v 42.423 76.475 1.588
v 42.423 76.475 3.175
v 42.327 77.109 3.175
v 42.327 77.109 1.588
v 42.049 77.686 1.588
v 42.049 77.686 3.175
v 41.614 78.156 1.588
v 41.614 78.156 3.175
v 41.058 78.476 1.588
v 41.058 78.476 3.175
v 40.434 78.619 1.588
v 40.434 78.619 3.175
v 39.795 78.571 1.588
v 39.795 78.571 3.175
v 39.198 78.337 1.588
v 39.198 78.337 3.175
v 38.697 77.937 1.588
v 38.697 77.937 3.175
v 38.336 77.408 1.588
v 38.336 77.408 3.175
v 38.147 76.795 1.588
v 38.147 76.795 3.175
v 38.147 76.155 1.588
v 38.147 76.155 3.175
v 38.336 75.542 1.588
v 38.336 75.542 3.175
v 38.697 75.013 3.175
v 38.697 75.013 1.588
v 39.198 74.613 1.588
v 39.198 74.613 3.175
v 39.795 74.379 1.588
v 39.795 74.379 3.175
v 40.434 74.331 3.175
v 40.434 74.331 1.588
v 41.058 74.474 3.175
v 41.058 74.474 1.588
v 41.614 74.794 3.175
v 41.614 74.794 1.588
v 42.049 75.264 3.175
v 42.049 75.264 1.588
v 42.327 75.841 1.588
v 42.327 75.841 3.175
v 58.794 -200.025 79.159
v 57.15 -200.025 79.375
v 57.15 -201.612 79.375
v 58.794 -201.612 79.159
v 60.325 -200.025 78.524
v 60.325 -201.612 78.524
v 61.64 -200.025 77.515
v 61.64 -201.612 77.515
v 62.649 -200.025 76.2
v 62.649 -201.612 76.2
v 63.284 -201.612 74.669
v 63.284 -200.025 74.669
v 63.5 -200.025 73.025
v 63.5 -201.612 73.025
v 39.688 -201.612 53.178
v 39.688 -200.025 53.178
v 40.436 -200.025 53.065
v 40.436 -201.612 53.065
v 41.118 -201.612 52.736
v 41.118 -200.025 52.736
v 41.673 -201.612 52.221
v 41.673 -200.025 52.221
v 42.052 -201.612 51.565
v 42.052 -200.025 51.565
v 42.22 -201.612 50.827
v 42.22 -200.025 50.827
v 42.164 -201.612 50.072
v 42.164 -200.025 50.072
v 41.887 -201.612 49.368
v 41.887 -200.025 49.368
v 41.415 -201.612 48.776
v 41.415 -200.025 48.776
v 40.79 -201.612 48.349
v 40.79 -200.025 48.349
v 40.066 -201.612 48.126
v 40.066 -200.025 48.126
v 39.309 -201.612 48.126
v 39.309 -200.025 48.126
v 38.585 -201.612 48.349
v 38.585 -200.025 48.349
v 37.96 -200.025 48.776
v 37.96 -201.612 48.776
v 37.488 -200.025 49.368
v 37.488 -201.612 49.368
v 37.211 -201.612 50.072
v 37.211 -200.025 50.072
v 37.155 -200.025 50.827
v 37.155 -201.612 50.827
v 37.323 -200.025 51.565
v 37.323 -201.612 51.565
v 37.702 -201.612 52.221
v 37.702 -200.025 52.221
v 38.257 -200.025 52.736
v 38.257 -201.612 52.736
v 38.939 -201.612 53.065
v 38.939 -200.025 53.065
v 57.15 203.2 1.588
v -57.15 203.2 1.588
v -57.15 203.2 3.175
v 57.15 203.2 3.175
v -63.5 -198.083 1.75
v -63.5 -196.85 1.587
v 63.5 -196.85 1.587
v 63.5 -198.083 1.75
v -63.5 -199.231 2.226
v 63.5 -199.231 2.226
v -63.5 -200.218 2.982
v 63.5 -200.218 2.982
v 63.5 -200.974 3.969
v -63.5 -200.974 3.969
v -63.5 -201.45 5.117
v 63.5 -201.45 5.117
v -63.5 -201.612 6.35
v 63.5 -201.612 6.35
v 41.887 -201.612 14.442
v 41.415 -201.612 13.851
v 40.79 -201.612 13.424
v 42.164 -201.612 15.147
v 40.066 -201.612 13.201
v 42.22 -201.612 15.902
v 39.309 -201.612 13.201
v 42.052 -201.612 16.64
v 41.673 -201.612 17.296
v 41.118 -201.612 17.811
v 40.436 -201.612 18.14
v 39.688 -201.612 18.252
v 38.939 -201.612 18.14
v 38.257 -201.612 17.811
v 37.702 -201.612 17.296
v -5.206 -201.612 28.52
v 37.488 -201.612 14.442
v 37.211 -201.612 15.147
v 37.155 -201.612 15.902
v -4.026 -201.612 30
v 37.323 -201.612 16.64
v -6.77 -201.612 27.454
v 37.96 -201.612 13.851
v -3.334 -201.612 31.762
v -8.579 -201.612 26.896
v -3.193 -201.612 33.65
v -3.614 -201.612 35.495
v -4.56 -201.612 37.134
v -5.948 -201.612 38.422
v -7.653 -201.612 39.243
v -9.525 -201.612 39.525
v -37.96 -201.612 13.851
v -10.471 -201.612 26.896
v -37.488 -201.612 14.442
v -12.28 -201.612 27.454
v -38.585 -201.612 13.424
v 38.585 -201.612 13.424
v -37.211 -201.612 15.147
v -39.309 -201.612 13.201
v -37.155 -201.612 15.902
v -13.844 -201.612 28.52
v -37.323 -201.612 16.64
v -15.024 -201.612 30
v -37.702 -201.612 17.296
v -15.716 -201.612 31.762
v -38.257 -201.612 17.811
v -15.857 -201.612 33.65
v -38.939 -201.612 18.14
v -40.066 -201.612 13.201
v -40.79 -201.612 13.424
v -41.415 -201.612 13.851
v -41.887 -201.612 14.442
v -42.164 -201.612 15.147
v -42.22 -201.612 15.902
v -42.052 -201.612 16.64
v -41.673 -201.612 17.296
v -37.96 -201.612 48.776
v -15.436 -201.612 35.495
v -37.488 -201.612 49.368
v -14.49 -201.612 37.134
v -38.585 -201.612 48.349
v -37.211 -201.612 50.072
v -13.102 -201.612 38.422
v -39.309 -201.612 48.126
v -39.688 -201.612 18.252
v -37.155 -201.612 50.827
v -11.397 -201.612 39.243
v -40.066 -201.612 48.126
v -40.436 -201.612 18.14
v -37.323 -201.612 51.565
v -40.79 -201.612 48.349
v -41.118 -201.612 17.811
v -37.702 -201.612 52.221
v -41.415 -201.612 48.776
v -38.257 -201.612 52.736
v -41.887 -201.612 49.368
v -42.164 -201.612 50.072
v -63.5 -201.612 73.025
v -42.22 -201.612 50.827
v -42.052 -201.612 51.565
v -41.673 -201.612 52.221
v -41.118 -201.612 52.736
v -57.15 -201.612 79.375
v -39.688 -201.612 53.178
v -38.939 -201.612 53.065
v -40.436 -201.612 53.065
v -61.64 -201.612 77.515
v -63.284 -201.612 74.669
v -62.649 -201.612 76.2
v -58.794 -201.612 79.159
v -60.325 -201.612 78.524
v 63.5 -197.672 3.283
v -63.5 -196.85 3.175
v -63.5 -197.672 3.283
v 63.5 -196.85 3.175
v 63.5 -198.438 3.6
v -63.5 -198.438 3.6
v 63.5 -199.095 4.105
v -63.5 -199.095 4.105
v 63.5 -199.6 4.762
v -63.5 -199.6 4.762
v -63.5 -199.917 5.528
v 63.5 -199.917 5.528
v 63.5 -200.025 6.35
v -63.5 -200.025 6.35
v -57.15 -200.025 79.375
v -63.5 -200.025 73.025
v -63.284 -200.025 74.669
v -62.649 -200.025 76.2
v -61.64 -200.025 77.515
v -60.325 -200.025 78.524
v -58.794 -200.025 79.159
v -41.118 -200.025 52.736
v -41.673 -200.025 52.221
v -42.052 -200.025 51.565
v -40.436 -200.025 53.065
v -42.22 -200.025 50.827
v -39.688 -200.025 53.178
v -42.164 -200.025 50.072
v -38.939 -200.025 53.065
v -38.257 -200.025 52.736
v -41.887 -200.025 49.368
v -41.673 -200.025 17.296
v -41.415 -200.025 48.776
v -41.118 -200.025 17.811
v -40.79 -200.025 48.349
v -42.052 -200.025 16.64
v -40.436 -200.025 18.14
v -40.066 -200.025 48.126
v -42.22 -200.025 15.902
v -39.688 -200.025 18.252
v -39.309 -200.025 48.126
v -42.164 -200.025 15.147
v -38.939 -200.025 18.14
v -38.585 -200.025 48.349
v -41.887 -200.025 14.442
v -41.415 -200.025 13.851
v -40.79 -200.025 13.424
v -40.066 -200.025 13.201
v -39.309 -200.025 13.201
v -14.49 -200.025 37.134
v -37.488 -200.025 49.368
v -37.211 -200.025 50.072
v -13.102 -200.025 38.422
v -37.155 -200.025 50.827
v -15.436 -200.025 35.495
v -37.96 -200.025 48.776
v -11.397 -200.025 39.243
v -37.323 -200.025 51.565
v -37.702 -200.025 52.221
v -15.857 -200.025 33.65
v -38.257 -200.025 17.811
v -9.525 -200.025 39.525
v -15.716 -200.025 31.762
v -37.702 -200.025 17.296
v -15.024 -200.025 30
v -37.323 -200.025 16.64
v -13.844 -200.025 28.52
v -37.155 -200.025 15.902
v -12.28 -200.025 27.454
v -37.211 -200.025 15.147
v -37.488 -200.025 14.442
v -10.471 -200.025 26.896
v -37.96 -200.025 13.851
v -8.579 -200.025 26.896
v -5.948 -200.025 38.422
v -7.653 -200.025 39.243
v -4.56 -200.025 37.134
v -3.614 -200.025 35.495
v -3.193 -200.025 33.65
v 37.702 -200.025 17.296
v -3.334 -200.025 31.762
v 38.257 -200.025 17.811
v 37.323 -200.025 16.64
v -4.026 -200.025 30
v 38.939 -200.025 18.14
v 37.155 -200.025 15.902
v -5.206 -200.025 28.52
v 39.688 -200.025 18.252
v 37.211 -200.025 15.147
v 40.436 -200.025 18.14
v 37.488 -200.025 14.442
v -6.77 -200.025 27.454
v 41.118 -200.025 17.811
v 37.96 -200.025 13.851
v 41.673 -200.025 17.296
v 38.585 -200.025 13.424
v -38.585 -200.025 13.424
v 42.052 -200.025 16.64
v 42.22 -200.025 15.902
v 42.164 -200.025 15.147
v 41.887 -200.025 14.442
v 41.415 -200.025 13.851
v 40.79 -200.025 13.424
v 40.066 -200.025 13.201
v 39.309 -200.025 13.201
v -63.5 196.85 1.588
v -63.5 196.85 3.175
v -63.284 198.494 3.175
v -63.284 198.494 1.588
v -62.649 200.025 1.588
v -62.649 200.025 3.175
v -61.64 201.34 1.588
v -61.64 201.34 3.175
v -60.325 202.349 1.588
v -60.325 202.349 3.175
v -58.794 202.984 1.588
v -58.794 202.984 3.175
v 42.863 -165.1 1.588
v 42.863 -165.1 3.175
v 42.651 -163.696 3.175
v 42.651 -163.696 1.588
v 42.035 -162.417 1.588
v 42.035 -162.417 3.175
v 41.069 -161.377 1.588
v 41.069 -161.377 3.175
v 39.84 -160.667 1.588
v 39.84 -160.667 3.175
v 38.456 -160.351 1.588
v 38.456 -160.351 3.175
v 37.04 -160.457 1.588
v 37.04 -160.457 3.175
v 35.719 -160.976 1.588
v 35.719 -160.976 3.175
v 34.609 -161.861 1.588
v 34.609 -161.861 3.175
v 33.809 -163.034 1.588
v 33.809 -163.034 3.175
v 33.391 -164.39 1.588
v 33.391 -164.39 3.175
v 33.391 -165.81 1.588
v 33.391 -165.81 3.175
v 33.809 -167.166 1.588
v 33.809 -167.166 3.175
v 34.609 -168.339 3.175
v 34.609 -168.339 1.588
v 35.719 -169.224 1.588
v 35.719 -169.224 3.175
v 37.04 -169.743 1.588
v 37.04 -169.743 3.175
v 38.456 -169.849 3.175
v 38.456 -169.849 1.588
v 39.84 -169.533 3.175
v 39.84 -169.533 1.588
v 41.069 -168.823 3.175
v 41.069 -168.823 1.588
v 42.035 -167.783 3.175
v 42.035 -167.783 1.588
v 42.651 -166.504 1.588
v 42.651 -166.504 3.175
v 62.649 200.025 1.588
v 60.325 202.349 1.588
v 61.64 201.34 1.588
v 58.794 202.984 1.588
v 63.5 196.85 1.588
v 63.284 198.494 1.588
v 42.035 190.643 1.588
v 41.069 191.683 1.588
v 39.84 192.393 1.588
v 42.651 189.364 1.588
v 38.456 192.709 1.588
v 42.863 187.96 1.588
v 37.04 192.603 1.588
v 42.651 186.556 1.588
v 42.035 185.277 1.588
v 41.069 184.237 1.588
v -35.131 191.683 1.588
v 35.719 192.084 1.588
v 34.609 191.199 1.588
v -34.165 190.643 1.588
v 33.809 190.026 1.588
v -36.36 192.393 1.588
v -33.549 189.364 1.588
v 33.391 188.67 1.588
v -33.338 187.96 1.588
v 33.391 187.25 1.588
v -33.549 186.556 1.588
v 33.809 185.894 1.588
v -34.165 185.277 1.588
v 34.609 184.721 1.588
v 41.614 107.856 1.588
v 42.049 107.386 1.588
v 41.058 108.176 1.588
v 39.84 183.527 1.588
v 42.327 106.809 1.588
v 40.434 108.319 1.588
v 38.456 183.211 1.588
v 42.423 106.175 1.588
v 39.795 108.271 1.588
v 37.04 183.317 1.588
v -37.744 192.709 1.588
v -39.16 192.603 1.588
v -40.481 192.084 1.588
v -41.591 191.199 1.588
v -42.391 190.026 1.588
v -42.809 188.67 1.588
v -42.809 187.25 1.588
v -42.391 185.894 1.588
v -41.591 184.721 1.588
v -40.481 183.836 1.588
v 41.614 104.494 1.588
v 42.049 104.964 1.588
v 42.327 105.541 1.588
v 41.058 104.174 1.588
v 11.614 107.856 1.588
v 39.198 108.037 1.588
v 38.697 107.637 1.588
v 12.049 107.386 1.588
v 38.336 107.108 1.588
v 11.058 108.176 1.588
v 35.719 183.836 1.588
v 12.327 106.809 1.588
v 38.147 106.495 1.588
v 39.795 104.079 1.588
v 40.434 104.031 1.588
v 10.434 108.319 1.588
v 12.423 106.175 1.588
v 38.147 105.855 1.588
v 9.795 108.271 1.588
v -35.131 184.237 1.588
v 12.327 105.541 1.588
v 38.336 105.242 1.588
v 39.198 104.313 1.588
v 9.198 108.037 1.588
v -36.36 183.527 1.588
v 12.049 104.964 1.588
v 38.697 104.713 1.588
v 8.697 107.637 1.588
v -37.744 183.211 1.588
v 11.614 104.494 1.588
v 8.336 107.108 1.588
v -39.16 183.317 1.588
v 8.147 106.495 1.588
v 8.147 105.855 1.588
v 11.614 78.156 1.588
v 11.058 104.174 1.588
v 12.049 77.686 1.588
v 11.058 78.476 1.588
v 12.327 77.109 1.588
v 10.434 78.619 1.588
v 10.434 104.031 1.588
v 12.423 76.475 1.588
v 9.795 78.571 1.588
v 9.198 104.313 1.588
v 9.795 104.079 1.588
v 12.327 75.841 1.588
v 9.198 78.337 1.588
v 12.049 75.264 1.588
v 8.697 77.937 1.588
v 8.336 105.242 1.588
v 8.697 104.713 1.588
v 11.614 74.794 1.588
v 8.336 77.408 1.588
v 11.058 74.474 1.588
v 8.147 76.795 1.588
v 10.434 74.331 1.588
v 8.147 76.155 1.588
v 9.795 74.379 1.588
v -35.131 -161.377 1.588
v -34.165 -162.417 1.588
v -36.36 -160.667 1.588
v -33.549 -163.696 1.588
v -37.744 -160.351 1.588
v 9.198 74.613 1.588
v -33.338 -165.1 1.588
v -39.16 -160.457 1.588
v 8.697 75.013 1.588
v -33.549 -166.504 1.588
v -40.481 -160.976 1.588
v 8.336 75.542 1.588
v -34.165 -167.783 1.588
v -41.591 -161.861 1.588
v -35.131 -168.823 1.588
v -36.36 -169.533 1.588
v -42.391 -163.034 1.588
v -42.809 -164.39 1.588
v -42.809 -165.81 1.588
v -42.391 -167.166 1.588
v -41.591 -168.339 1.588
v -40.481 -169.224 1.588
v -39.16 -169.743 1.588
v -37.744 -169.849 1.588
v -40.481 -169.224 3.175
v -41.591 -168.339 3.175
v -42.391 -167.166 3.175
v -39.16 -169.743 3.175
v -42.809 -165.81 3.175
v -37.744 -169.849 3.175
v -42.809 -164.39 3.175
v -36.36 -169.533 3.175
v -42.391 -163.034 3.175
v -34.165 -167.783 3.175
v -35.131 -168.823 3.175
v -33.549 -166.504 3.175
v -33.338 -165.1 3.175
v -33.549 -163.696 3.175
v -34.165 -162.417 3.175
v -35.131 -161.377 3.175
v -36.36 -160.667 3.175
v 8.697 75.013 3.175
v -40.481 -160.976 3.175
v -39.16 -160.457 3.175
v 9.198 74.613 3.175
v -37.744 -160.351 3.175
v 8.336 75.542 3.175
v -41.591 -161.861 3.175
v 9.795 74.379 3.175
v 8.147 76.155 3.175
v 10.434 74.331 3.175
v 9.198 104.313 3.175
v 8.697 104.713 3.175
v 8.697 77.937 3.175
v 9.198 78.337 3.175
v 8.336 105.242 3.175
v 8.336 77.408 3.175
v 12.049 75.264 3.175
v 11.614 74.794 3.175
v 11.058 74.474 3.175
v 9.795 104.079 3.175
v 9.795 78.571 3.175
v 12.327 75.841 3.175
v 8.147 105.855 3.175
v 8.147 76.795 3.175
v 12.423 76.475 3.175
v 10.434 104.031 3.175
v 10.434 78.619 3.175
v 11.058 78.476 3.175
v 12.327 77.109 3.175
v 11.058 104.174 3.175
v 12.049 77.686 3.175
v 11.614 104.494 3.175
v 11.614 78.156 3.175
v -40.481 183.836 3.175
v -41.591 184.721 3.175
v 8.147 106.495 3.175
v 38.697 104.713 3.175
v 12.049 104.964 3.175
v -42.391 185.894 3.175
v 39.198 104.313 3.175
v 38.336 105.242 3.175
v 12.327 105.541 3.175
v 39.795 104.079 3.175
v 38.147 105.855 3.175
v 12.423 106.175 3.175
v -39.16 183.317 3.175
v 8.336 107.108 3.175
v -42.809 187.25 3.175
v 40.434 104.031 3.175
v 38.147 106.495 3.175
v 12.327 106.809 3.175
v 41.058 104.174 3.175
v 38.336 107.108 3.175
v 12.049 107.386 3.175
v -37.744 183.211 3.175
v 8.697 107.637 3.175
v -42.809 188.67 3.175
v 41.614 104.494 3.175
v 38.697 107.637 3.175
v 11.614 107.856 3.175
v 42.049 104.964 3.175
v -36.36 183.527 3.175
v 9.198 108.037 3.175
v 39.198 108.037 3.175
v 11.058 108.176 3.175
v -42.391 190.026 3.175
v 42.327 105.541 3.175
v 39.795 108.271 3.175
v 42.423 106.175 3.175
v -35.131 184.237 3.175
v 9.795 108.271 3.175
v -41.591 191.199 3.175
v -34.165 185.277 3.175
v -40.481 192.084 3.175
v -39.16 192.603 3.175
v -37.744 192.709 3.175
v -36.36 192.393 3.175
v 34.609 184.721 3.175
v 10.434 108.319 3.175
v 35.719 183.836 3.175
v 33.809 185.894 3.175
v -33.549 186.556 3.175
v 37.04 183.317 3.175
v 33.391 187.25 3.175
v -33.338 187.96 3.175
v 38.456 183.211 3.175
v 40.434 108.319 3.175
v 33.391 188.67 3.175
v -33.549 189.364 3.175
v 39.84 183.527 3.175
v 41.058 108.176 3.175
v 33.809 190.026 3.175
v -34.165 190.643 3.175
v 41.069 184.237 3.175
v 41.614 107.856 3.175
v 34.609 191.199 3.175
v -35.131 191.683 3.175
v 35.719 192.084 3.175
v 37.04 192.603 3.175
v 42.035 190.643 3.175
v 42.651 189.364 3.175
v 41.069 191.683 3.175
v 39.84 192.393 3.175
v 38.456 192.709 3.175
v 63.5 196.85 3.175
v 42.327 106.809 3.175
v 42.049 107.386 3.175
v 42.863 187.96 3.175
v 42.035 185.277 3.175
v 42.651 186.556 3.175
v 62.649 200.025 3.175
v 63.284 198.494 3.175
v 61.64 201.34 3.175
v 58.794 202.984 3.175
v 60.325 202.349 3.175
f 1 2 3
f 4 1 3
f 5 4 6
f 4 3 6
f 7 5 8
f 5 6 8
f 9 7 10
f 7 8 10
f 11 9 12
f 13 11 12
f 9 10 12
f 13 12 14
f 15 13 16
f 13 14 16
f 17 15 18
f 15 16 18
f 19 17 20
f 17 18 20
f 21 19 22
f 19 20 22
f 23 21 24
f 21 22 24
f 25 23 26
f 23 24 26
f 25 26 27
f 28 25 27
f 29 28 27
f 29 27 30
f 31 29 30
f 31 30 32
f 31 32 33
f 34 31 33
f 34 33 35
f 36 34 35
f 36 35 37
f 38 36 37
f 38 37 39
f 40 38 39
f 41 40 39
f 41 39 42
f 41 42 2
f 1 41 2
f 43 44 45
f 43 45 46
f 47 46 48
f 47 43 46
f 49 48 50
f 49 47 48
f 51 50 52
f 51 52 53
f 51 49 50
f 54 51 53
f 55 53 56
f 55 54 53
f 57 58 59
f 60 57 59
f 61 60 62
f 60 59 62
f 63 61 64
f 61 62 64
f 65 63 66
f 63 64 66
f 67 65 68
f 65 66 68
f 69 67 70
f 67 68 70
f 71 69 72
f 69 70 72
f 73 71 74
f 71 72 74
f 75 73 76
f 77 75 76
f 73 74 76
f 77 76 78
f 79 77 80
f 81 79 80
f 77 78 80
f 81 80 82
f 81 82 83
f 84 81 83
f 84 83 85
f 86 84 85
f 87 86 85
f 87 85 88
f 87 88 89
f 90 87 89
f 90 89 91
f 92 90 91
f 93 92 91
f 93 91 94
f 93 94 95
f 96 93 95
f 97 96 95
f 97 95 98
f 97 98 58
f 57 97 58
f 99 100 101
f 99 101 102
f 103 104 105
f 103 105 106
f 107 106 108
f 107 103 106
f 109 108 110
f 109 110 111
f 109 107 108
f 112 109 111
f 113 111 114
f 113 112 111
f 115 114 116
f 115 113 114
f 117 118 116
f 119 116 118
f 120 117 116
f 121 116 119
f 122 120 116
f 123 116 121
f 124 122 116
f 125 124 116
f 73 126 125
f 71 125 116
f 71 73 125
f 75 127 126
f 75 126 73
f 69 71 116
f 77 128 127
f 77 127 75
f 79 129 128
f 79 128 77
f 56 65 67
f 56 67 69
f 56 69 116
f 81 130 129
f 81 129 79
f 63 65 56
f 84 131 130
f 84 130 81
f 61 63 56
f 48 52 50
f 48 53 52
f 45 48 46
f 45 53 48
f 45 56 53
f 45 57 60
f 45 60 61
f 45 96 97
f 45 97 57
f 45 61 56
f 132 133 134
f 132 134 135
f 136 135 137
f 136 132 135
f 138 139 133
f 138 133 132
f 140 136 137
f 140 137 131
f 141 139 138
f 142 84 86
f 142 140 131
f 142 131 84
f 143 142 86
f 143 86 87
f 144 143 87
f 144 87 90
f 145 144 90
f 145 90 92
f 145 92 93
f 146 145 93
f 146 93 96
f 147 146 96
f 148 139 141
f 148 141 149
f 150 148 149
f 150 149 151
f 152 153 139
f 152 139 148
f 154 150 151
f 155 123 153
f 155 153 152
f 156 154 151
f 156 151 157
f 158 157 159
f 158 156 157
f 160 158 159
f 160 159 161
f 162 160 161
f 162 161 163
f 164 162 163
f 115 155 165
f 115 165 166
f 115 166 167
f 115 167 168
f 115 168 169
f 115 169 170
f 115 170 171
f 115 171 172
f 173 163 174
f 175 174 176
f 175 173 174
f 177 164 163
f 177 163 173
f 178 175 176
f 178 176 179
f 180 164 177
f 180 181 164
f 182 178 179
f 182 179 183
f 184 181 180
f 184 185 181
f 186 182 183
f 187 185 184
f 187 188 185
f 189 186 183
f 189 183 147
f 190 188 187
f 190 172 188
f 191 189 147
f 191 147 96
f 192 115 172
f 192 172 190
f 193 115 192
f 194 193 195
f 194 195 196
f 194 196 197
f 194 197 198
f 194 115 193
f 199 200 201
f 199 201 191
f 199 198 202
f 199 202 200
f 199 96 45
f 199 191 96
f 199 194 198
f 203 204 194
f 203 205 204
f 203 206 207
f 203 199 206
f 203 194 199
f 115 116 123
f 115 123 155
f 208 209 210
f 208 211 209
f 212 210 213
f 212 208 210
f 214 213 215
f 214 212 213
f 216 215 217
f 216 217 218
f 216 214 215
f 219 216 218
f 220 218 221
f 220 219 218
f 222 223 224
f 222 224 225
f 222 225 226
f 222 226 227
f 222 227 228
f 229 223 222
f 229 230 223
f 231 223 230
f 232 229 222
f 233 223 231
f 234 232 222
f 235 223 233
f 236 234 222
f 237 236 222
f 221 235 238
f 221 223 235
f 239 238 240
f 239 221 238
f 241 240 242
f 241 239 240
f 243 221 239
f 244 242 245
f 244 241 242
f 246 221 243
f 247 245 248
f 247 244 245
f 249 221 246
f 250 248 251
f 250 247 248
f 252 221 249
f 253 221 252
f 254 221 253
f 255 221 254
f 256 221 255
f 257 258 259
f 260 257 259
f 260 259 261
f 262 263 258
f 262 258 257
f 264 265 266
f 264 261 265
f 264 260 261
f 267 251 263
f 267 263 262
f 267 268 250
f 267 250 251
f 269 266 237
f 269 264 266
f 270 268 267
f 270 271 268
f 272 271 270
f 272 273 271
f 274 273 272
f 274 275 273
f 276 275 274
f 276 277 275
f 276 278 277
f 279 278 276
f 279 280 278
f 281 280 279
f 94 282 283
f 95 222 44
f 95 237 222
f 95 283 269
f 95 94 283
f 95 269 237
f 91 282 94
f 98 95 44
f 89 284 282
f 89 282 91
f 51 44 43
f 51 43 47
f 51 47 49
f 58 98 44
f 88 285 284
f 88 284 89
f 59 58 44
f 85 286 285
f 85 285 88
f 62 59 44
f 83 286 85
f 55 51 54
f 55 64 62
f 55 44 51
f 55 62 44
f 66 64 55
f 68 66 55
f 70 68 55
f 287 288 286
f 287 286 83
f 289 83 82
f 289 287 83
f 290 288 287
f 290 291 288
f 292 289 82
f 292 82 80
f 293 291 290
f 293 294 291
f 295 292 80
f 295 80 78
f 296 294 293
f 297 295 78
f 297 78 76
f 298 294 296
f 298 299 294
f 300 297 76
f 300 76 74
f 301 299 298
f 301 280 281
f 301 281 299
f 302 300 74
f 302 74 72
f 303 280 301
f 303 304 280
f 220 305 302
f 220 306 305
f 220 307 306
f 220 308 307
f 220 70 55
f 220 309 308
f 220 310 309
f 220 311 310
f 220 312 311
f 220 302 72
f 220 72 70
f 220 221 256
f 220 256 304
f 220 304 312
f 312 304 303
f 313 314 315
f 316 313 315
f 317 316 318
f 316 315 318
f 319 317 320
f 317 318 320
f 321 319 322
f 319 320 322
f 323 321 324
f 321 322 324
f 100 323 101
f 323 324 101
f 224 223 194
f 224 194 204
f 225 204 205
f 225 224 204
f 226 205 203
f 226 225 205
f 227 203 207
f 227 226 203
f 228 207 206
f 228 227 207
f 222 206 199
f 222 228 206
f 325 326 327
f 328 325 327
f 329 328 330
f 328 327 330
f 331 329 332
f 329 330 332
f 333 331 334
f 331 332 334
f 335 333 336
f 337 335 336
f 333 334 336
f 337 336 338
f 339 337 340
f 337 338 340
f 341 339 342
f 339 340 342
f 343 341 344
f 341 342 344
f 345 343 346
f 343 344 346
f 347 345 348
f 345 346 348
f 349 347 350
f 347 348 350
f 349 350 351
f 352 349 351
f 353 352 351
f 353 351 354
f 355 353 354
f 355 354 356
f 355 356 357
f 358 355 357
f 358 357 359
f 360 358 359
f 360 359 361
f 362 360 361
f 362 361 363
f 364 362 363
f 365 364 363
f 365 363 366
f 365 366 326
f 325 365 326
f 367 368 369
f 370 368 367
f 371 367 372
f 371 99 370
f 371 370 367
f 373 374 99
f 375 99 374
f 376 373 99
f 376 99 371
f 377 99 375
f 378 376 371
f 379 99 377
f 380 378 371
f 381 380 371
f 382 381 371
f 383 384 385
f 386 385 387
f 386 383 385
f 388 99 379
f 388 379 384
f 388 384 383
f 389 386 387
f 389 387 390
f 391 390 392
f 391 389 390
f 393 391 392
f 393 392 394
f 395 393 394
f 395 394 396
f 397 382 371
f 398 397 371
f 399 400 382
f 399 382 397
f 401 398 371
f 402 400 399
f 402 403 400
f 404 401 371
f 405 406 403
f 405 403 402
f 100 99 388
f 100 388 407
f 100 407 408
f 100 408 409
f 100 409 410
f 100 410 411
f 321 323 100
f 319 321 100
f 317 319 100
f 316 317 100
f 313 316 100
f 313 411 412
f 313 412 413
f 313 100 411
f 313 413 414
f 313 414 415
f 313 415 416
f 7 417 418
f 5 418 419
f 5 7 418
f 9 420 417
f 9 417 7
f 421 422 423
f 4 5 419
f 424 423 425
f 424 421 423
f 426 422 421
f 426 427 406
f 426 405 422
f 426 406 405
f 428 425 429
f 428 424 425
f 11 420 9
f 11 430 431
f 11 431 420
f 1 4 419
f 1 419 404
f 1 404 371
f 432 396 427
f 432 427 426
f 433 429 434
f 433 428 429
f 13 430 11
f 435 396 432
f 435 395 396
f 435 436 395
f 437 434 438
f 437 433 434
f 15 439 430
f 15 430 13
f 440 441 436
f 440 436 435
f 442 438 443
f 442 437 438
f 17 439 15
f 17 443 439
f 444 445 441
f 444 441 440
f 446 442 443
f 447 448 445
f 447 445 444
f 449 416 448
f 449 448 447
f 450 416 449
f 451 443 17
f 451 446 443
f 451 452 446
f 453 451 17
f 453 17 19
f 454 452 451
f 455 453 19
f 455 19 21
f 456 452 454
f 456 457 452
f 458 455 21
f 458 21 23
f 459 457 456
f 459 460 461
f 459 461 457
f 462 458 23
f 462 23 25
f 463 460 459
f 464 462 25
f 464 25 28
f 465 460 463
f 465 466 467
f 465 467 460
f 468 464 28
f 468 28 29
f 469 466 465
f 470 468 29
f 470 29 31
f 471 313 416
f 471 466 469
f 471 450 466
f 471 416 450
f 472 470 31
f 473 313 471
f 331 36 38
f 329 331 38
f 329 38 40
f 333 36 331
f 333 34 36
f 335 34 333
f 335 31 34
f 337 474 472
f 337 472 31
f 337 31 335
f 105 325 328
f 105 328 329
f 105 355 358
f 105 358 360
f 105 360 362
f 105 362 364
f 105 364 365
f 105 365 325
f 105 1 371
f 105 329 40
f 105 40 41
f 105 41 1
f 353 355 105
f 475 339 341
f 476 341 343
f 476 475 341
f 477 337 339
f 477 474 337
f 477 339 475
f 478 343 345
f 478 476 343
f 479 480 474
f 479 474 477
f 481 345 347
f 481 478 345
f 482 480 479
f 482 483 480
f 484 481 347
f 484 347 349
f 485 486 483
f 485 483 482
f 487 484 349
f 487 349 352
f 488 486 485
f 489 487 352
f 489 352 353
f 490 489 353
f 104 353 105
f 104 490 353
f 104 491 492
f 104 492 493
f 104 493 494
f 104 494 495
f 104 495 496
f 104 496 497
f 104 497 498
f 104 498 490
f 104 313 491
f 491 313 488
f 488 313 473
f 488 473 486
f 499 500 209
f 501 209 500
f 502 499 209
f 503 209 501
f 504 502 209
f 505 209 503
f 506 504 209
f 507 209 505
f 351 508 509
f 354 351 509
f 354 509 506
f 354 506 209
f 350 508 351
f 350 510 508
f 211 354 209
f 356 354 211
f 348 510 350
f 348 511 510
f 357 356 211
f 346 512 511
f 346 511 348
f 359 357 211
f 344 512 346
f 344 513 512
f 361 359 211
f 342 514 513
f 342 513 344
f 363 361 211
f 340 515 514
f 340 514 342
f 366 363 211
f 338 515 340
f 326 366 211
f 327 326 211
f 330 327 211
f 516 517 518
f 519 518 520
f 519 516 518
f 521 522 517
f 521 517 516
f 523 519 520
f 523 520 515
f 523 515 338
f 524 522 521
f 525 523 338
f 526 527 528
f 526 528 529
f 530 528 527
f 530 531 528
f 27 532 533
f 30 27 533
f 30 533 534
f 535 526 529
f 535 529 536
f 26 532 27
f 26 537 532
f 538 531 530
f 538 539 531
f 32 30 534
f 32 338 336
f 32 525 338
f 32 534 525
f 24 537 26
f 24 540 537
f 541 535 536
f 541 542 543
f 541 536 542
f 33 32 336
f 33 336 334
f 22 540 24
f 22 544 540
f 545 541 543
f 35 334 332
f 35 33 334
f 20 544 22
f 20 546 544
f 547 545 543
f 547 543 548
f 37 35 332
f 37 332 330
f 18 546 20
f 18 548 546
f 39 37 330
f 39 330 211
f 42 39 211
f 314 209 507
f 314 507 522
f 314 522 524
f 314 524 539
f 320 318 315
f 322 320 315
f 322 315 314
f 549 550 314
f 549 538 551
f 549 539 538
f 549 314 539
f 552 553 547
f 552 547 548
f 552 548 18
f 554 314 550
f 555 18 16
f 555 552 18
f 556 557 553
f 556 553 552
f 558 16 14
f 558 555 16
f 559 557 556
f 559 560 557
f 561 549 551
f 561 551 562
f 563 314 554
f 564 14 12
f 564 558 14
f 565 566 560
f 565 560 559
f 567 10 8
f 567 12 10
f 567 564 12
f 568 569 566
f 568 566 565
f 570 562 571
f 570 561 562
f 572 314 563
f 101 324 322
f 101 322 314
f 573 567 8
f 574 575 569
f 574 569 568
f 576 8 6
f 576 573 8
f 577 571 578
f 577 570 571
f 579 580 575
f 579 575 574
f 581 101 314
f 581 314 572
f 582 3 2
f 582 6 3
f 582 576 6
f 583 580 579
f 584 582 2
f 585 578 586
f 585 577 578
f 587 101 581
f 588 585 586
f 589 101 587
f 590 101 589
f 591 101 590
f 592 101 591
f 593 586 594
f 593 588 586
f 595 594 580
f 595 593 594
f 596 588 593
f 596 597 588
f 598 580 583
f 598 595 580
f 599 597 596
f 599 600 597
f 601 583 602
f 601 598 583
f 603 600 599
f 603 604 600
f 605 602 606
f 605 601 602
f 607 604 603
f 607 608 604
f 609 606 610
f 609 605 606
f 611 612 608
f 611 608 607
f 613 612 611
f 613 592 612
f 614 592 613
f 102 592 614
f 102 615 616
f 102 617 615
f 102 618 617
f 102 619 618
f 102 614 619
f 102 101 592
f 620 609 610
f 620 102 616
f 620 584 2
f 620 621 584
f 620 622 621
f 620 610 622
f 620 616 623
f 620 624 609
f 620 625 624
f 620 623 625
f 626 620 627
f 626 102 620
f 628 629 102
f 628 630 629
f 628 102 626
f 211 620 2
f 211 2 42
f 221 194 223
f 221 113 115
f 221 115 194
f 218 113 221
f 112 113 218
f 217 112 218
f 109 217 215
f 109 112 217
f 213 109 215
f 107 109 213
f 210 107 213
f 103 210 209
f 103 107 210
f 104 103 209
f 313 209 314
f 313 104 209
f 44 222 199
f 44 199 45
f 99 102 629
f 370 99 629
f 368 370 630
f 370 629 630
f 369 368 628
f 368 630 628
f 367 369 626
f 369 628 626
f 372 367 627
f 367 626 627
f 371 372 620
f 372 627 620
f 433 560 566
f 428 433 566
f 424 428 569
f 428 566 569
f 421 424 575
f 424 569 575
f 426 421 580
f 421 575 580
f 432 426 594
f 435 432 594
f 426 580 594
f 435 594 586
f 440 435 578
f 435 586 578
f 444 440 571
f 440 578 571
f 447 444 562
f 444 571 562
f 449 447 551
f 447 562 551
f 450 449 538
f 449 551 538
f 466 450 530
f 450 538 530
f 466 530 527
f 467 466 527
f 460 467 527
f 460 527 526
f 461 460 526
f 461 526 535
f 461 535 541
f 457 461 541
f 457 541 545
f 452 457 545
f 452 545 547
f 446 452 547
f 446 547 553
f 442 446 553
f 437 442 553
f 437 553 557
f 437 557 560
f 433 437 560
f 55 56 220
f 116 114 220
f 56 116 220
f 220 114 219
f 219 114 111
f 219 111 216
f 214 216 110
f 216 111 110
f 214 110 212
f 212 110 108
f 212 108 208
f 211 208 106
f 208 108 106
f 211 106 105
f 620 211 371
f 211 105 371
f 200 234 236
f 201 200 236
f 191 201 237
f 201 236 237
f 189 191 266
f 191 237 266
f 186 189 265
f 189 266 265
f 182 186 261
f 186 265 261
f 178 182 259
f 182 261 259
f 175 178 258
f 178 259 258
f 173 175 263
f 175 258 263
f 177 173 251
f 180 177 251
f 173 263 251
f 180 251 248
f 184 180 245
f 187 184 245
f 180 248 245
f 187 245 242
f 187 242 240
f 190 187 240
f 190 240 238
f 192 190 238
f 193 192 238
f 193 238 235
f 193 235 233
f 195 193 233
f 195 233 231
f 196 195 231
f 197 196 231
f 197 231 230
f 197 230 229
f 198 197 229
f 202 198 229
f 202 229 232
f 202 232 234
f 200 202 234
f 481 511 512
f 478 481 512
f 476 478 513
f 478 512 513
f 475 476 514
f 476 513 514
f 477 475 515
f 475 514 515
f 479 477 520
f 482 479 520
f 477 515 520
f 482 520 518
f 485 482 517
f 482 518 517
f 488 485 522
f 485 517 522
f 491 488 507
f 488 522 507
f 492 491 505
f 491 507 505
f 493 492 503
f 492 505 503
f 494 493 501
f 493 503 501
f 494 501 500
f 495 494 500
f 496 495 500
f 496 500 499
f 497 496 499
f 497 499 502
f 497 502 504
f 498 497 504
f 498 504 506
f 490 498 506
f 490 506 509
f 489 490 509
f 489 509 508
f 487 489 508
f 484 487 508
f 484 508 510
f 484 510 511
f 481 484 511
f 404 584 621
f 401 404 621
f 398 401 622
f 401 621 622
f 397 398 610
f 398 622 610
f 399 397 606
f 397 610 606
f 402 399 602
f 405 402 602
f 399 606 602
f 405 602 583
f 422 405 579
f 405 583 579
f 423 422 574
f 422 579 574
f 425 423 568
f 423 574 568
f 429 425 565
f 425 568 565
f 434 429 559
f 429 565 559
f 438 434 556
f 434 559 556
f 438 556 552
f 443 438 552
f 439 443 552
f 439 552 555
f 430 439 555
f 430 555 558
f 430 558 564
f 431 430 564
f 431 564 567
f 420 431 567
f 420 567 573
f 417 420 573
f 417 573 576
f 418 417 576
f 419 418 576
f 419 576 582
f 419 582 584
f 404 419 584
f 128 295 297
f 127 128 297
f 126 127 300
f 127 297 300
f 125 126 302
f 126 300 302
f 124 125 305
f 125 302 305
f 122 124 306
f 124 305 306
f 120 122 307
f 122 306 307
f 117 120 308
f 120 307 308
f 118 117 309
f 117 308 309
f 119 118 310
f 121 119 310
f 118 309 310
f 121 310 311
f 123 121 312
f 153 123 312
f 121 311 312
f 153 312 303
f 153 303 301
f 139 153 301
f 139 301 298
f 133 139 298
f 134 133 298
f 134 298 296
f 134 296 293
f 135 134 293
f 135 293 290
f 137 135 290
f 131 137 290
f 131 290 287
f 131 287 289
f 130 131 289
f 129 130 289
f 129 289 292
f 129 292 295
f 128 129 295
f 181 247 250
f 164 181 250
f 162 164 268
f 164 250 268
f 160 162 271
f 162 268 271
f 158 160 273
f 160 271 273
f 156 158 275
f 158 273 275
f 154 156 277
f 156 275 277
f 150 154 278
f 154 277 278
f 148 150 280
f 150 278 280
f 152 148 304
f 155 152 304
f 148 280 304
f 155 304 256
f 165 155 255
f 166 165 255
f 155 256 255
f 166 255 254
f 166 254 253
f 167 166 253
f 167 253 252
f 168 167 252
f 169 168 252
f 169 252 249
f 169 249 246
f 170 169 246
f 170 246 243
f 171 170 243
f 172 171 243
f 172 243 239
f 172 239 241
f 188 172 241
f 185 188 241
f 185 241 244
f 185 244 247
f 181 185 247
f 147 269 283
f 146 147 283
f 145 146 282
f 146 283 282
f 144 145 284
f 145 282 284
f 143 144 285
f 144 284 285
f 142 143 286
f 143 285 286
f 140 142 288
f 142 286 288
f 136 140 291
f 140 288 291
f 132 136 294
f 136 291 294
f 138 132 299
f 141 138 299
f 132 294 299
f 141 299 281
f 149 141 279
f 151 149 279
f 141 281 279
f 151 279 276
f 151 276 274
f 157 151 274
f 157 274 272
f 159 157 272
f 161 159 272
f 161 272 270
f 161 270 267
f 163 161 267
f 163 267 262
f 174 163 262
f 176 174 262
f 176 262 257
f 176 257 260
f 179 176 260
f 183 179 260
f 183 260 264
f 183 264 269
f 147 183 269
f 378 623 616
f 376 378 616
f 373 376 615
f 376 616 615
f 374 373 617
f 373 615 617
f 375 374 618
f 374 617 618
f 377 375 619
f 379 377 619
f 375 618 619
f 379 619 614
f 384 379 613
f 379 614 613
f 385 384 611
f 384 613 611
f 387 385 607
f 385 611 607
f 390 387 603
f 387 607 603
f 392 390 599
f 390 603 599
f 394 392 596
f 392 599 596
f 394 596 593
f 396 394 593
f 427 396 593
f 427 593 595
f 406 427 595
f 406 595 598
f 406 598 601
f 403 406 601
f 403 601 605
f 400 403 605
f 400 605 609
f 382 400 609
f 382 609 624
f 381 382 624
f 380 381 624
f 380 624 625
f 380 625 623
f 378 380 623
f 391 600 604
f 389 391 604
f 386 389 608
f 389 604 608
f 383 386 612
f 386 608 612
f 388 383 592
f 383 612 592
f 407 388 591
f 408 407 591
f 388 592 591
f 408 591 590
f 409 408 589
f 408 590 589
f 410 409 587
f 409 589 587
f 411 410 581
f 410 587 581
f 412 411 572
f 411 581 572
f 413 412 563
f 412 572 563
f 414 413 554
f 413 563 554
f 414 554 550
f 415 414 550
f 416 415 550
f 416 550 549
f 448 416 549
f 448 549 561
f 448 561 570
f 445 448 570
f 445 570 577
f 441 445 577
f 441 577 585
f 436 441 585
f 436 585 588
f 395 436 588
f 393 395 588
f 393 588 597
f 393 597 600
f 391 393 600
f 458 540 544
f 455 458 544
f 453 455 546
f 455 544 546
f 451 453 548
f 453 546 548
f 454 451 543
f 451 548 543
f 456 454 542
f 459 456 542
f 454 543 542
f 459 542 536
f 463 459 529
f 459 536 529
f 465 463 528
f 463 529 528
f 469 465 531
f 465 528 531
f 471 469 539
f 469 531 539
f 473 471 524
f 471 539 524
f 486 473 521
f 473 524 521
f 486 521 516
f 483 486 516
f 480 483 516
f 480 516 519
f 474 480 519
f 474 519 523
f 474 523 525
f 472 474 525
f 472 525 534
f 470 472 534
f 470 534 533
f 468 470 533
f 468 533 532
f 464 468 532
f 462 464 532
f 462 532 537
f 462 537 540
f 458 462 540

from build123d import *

# Parameters (mm, degrees)
SKETCH2_W            = 127
SKETCH2_H            = 406.4
BOSS_EXTRUDE1_DEPTH  = 3.175
SKETCH3_W            = 127
SKETCH3_H            = 3.175
BOSS_EXTRUDE2_DEPTH  = 76.2
FILLET1_R            = 3.175
FILLET2_R            = 6.35
SKETCH4_R            = 6.35
SKETCH4_R_2          = 2.54
CUT_EXTRUDE1_DEPTH   = 416.840163104
SKETCH5_R            = 2.15
SKETCH5_R_2          = 4.7625
CUT_EXTRUDE2_DEPTH   = 227.117071448
CONVERT_SOLID1_START = -63.5
CONVERT_SOLID1_DEPTH = 127


# Read off the part's stored shape, not the designer's step: Convert-Solid1
with BuildPart() as part:
    # Sketch2 → Boss-Extrude1 (new body)
    with BuildSketch(Plane.XY):
        Rectangle(SKETCH2_W, SKETCH2_H)
    extrude(amount=BOSS_EXTRUDE1_DEPTH)

    # Sketch3 → Boss-Extrude2 (add)
    with BuildSketch(Plane.XY.offset(3.175)):
        with Locations((0, -201.6125)):
            Rectangle(SKETCH3_W, SKETCH3_H)
    extrude(amount=BOSS_EXTRUDE2_DEPTH)

    # Fillet1
    fillet1_edges = [part.edges().sort_by_distance(p)[0] for p in [
        (0, -200.025, 3.175),
        (0, -203.2, 0),
    ]]
    fillet(fillet1_edges, radius=FILLET1_R)

    # Fillet2
    fillet2_edges = [part.edges().sort_by_distance(p)[0] for p in [
        (-63.5, -201.6125, 79.375),
        (63.5, -201.6125, 79.375),
        (-63.5, 203.2, 1.5875),
        (63.5, 203.2, 1.5875),
    ]]
    fillet(fillet2_edges, radius=FILLET2_R)

    # Sketch4 → Cut-Extrude1 (cut, through all)
    with BuildSketch(Plane(origin=(0, -200.025, 0), x_dir=(1, 0, 0), z_dir=(0, 1, 0))):
        with Locations(Location((-9.525, -33.175, 0), (0, 0, 270))):
            Circle(SKETCH4_R)
        with Locations(Location((-39.6875, -15.7125, 0), (0, 0, 270))):
            Circle(SKETCH4_R_2)
        with Locations(Location((-39.6875, -50.6375, 0), (0, 0, 270))):
            Circle(SKETCH4_R_2)
        with Locations(Location((39.6875, -15.7125, 0), (0, 0, 270))):
            Circle(SKETCH4_R_2)
        with Locations(Location((39.6875, -50.6375, 0), (0, 0, 270))):
            Circle(SKETCH4_R_2)
    extrude(amount=-CUT_EXTRUDE1_DEPTH, mode=Mode.SUBTRACT)

    # Sketch5 → Cut-Extrude2 (cut, through all)
    with BuildSketch(Plane.XY.offset(3.175)):
        with Locations((10.273, 76.475)):
            Circle(SKETCH5_R)
        with Locations((40.273, 76.475)):
            Circle(SKETCH5_R)
        with Locations((40.273, 106.175)):
            Circle(SKETCH5_R)
        with Locations((10.273, 106.175)):
            Circle(SKETCH5_R)
        with Locations((-38.1, 187.96)):
            Circle(SKETCH5_R_2)
        with Locations((38.1, 187.96)):
            Circle(SKETCH5_R_2)
        with Locations((-38.1, -165.1)):
            Circle(SKETCH5_R_2)
        with Locations((38.1, -165.1)):
            Circle(SKETCH5_R_2)
    extrude(amount=-CUT_EXTRUDE2_DEPTH, mode=Mode.SUBTRACT)

    # Convert-Solid1 outline → Convert-Solid1 (cut)
    with BuildSketch(Plane.YZ.offset(CONVERT_SOLID1_START)):
        with BuildLine():
            ThreePointArc((-196.85, 1.5875), (-200.217596045, 2.982403955), (-201.6125, 6.35))
            Line((-201.6125, 6.35), (-201.6125, 79.375))
            Line((-201.6125, 79.375), (-203.2, 79.375))
            Line((-203.2, 79.375), (-203.2, 3.175))
            ThreePointArc((-203.2, 3.175), (-202.27006403, 0.92993597), (-200.025, 0))
            Line((-200.025, 0), (203.2, 0))
            Line((203.2, 0), (203.2, 1.5875))
            Line((203.2, 1.5875), (-196.85, 1.5875))
        make_face()
    extrude(amount=CONVERT_SOLID1_DEPTH, mode=Mode.SUBTRACT)


solid = part.part
